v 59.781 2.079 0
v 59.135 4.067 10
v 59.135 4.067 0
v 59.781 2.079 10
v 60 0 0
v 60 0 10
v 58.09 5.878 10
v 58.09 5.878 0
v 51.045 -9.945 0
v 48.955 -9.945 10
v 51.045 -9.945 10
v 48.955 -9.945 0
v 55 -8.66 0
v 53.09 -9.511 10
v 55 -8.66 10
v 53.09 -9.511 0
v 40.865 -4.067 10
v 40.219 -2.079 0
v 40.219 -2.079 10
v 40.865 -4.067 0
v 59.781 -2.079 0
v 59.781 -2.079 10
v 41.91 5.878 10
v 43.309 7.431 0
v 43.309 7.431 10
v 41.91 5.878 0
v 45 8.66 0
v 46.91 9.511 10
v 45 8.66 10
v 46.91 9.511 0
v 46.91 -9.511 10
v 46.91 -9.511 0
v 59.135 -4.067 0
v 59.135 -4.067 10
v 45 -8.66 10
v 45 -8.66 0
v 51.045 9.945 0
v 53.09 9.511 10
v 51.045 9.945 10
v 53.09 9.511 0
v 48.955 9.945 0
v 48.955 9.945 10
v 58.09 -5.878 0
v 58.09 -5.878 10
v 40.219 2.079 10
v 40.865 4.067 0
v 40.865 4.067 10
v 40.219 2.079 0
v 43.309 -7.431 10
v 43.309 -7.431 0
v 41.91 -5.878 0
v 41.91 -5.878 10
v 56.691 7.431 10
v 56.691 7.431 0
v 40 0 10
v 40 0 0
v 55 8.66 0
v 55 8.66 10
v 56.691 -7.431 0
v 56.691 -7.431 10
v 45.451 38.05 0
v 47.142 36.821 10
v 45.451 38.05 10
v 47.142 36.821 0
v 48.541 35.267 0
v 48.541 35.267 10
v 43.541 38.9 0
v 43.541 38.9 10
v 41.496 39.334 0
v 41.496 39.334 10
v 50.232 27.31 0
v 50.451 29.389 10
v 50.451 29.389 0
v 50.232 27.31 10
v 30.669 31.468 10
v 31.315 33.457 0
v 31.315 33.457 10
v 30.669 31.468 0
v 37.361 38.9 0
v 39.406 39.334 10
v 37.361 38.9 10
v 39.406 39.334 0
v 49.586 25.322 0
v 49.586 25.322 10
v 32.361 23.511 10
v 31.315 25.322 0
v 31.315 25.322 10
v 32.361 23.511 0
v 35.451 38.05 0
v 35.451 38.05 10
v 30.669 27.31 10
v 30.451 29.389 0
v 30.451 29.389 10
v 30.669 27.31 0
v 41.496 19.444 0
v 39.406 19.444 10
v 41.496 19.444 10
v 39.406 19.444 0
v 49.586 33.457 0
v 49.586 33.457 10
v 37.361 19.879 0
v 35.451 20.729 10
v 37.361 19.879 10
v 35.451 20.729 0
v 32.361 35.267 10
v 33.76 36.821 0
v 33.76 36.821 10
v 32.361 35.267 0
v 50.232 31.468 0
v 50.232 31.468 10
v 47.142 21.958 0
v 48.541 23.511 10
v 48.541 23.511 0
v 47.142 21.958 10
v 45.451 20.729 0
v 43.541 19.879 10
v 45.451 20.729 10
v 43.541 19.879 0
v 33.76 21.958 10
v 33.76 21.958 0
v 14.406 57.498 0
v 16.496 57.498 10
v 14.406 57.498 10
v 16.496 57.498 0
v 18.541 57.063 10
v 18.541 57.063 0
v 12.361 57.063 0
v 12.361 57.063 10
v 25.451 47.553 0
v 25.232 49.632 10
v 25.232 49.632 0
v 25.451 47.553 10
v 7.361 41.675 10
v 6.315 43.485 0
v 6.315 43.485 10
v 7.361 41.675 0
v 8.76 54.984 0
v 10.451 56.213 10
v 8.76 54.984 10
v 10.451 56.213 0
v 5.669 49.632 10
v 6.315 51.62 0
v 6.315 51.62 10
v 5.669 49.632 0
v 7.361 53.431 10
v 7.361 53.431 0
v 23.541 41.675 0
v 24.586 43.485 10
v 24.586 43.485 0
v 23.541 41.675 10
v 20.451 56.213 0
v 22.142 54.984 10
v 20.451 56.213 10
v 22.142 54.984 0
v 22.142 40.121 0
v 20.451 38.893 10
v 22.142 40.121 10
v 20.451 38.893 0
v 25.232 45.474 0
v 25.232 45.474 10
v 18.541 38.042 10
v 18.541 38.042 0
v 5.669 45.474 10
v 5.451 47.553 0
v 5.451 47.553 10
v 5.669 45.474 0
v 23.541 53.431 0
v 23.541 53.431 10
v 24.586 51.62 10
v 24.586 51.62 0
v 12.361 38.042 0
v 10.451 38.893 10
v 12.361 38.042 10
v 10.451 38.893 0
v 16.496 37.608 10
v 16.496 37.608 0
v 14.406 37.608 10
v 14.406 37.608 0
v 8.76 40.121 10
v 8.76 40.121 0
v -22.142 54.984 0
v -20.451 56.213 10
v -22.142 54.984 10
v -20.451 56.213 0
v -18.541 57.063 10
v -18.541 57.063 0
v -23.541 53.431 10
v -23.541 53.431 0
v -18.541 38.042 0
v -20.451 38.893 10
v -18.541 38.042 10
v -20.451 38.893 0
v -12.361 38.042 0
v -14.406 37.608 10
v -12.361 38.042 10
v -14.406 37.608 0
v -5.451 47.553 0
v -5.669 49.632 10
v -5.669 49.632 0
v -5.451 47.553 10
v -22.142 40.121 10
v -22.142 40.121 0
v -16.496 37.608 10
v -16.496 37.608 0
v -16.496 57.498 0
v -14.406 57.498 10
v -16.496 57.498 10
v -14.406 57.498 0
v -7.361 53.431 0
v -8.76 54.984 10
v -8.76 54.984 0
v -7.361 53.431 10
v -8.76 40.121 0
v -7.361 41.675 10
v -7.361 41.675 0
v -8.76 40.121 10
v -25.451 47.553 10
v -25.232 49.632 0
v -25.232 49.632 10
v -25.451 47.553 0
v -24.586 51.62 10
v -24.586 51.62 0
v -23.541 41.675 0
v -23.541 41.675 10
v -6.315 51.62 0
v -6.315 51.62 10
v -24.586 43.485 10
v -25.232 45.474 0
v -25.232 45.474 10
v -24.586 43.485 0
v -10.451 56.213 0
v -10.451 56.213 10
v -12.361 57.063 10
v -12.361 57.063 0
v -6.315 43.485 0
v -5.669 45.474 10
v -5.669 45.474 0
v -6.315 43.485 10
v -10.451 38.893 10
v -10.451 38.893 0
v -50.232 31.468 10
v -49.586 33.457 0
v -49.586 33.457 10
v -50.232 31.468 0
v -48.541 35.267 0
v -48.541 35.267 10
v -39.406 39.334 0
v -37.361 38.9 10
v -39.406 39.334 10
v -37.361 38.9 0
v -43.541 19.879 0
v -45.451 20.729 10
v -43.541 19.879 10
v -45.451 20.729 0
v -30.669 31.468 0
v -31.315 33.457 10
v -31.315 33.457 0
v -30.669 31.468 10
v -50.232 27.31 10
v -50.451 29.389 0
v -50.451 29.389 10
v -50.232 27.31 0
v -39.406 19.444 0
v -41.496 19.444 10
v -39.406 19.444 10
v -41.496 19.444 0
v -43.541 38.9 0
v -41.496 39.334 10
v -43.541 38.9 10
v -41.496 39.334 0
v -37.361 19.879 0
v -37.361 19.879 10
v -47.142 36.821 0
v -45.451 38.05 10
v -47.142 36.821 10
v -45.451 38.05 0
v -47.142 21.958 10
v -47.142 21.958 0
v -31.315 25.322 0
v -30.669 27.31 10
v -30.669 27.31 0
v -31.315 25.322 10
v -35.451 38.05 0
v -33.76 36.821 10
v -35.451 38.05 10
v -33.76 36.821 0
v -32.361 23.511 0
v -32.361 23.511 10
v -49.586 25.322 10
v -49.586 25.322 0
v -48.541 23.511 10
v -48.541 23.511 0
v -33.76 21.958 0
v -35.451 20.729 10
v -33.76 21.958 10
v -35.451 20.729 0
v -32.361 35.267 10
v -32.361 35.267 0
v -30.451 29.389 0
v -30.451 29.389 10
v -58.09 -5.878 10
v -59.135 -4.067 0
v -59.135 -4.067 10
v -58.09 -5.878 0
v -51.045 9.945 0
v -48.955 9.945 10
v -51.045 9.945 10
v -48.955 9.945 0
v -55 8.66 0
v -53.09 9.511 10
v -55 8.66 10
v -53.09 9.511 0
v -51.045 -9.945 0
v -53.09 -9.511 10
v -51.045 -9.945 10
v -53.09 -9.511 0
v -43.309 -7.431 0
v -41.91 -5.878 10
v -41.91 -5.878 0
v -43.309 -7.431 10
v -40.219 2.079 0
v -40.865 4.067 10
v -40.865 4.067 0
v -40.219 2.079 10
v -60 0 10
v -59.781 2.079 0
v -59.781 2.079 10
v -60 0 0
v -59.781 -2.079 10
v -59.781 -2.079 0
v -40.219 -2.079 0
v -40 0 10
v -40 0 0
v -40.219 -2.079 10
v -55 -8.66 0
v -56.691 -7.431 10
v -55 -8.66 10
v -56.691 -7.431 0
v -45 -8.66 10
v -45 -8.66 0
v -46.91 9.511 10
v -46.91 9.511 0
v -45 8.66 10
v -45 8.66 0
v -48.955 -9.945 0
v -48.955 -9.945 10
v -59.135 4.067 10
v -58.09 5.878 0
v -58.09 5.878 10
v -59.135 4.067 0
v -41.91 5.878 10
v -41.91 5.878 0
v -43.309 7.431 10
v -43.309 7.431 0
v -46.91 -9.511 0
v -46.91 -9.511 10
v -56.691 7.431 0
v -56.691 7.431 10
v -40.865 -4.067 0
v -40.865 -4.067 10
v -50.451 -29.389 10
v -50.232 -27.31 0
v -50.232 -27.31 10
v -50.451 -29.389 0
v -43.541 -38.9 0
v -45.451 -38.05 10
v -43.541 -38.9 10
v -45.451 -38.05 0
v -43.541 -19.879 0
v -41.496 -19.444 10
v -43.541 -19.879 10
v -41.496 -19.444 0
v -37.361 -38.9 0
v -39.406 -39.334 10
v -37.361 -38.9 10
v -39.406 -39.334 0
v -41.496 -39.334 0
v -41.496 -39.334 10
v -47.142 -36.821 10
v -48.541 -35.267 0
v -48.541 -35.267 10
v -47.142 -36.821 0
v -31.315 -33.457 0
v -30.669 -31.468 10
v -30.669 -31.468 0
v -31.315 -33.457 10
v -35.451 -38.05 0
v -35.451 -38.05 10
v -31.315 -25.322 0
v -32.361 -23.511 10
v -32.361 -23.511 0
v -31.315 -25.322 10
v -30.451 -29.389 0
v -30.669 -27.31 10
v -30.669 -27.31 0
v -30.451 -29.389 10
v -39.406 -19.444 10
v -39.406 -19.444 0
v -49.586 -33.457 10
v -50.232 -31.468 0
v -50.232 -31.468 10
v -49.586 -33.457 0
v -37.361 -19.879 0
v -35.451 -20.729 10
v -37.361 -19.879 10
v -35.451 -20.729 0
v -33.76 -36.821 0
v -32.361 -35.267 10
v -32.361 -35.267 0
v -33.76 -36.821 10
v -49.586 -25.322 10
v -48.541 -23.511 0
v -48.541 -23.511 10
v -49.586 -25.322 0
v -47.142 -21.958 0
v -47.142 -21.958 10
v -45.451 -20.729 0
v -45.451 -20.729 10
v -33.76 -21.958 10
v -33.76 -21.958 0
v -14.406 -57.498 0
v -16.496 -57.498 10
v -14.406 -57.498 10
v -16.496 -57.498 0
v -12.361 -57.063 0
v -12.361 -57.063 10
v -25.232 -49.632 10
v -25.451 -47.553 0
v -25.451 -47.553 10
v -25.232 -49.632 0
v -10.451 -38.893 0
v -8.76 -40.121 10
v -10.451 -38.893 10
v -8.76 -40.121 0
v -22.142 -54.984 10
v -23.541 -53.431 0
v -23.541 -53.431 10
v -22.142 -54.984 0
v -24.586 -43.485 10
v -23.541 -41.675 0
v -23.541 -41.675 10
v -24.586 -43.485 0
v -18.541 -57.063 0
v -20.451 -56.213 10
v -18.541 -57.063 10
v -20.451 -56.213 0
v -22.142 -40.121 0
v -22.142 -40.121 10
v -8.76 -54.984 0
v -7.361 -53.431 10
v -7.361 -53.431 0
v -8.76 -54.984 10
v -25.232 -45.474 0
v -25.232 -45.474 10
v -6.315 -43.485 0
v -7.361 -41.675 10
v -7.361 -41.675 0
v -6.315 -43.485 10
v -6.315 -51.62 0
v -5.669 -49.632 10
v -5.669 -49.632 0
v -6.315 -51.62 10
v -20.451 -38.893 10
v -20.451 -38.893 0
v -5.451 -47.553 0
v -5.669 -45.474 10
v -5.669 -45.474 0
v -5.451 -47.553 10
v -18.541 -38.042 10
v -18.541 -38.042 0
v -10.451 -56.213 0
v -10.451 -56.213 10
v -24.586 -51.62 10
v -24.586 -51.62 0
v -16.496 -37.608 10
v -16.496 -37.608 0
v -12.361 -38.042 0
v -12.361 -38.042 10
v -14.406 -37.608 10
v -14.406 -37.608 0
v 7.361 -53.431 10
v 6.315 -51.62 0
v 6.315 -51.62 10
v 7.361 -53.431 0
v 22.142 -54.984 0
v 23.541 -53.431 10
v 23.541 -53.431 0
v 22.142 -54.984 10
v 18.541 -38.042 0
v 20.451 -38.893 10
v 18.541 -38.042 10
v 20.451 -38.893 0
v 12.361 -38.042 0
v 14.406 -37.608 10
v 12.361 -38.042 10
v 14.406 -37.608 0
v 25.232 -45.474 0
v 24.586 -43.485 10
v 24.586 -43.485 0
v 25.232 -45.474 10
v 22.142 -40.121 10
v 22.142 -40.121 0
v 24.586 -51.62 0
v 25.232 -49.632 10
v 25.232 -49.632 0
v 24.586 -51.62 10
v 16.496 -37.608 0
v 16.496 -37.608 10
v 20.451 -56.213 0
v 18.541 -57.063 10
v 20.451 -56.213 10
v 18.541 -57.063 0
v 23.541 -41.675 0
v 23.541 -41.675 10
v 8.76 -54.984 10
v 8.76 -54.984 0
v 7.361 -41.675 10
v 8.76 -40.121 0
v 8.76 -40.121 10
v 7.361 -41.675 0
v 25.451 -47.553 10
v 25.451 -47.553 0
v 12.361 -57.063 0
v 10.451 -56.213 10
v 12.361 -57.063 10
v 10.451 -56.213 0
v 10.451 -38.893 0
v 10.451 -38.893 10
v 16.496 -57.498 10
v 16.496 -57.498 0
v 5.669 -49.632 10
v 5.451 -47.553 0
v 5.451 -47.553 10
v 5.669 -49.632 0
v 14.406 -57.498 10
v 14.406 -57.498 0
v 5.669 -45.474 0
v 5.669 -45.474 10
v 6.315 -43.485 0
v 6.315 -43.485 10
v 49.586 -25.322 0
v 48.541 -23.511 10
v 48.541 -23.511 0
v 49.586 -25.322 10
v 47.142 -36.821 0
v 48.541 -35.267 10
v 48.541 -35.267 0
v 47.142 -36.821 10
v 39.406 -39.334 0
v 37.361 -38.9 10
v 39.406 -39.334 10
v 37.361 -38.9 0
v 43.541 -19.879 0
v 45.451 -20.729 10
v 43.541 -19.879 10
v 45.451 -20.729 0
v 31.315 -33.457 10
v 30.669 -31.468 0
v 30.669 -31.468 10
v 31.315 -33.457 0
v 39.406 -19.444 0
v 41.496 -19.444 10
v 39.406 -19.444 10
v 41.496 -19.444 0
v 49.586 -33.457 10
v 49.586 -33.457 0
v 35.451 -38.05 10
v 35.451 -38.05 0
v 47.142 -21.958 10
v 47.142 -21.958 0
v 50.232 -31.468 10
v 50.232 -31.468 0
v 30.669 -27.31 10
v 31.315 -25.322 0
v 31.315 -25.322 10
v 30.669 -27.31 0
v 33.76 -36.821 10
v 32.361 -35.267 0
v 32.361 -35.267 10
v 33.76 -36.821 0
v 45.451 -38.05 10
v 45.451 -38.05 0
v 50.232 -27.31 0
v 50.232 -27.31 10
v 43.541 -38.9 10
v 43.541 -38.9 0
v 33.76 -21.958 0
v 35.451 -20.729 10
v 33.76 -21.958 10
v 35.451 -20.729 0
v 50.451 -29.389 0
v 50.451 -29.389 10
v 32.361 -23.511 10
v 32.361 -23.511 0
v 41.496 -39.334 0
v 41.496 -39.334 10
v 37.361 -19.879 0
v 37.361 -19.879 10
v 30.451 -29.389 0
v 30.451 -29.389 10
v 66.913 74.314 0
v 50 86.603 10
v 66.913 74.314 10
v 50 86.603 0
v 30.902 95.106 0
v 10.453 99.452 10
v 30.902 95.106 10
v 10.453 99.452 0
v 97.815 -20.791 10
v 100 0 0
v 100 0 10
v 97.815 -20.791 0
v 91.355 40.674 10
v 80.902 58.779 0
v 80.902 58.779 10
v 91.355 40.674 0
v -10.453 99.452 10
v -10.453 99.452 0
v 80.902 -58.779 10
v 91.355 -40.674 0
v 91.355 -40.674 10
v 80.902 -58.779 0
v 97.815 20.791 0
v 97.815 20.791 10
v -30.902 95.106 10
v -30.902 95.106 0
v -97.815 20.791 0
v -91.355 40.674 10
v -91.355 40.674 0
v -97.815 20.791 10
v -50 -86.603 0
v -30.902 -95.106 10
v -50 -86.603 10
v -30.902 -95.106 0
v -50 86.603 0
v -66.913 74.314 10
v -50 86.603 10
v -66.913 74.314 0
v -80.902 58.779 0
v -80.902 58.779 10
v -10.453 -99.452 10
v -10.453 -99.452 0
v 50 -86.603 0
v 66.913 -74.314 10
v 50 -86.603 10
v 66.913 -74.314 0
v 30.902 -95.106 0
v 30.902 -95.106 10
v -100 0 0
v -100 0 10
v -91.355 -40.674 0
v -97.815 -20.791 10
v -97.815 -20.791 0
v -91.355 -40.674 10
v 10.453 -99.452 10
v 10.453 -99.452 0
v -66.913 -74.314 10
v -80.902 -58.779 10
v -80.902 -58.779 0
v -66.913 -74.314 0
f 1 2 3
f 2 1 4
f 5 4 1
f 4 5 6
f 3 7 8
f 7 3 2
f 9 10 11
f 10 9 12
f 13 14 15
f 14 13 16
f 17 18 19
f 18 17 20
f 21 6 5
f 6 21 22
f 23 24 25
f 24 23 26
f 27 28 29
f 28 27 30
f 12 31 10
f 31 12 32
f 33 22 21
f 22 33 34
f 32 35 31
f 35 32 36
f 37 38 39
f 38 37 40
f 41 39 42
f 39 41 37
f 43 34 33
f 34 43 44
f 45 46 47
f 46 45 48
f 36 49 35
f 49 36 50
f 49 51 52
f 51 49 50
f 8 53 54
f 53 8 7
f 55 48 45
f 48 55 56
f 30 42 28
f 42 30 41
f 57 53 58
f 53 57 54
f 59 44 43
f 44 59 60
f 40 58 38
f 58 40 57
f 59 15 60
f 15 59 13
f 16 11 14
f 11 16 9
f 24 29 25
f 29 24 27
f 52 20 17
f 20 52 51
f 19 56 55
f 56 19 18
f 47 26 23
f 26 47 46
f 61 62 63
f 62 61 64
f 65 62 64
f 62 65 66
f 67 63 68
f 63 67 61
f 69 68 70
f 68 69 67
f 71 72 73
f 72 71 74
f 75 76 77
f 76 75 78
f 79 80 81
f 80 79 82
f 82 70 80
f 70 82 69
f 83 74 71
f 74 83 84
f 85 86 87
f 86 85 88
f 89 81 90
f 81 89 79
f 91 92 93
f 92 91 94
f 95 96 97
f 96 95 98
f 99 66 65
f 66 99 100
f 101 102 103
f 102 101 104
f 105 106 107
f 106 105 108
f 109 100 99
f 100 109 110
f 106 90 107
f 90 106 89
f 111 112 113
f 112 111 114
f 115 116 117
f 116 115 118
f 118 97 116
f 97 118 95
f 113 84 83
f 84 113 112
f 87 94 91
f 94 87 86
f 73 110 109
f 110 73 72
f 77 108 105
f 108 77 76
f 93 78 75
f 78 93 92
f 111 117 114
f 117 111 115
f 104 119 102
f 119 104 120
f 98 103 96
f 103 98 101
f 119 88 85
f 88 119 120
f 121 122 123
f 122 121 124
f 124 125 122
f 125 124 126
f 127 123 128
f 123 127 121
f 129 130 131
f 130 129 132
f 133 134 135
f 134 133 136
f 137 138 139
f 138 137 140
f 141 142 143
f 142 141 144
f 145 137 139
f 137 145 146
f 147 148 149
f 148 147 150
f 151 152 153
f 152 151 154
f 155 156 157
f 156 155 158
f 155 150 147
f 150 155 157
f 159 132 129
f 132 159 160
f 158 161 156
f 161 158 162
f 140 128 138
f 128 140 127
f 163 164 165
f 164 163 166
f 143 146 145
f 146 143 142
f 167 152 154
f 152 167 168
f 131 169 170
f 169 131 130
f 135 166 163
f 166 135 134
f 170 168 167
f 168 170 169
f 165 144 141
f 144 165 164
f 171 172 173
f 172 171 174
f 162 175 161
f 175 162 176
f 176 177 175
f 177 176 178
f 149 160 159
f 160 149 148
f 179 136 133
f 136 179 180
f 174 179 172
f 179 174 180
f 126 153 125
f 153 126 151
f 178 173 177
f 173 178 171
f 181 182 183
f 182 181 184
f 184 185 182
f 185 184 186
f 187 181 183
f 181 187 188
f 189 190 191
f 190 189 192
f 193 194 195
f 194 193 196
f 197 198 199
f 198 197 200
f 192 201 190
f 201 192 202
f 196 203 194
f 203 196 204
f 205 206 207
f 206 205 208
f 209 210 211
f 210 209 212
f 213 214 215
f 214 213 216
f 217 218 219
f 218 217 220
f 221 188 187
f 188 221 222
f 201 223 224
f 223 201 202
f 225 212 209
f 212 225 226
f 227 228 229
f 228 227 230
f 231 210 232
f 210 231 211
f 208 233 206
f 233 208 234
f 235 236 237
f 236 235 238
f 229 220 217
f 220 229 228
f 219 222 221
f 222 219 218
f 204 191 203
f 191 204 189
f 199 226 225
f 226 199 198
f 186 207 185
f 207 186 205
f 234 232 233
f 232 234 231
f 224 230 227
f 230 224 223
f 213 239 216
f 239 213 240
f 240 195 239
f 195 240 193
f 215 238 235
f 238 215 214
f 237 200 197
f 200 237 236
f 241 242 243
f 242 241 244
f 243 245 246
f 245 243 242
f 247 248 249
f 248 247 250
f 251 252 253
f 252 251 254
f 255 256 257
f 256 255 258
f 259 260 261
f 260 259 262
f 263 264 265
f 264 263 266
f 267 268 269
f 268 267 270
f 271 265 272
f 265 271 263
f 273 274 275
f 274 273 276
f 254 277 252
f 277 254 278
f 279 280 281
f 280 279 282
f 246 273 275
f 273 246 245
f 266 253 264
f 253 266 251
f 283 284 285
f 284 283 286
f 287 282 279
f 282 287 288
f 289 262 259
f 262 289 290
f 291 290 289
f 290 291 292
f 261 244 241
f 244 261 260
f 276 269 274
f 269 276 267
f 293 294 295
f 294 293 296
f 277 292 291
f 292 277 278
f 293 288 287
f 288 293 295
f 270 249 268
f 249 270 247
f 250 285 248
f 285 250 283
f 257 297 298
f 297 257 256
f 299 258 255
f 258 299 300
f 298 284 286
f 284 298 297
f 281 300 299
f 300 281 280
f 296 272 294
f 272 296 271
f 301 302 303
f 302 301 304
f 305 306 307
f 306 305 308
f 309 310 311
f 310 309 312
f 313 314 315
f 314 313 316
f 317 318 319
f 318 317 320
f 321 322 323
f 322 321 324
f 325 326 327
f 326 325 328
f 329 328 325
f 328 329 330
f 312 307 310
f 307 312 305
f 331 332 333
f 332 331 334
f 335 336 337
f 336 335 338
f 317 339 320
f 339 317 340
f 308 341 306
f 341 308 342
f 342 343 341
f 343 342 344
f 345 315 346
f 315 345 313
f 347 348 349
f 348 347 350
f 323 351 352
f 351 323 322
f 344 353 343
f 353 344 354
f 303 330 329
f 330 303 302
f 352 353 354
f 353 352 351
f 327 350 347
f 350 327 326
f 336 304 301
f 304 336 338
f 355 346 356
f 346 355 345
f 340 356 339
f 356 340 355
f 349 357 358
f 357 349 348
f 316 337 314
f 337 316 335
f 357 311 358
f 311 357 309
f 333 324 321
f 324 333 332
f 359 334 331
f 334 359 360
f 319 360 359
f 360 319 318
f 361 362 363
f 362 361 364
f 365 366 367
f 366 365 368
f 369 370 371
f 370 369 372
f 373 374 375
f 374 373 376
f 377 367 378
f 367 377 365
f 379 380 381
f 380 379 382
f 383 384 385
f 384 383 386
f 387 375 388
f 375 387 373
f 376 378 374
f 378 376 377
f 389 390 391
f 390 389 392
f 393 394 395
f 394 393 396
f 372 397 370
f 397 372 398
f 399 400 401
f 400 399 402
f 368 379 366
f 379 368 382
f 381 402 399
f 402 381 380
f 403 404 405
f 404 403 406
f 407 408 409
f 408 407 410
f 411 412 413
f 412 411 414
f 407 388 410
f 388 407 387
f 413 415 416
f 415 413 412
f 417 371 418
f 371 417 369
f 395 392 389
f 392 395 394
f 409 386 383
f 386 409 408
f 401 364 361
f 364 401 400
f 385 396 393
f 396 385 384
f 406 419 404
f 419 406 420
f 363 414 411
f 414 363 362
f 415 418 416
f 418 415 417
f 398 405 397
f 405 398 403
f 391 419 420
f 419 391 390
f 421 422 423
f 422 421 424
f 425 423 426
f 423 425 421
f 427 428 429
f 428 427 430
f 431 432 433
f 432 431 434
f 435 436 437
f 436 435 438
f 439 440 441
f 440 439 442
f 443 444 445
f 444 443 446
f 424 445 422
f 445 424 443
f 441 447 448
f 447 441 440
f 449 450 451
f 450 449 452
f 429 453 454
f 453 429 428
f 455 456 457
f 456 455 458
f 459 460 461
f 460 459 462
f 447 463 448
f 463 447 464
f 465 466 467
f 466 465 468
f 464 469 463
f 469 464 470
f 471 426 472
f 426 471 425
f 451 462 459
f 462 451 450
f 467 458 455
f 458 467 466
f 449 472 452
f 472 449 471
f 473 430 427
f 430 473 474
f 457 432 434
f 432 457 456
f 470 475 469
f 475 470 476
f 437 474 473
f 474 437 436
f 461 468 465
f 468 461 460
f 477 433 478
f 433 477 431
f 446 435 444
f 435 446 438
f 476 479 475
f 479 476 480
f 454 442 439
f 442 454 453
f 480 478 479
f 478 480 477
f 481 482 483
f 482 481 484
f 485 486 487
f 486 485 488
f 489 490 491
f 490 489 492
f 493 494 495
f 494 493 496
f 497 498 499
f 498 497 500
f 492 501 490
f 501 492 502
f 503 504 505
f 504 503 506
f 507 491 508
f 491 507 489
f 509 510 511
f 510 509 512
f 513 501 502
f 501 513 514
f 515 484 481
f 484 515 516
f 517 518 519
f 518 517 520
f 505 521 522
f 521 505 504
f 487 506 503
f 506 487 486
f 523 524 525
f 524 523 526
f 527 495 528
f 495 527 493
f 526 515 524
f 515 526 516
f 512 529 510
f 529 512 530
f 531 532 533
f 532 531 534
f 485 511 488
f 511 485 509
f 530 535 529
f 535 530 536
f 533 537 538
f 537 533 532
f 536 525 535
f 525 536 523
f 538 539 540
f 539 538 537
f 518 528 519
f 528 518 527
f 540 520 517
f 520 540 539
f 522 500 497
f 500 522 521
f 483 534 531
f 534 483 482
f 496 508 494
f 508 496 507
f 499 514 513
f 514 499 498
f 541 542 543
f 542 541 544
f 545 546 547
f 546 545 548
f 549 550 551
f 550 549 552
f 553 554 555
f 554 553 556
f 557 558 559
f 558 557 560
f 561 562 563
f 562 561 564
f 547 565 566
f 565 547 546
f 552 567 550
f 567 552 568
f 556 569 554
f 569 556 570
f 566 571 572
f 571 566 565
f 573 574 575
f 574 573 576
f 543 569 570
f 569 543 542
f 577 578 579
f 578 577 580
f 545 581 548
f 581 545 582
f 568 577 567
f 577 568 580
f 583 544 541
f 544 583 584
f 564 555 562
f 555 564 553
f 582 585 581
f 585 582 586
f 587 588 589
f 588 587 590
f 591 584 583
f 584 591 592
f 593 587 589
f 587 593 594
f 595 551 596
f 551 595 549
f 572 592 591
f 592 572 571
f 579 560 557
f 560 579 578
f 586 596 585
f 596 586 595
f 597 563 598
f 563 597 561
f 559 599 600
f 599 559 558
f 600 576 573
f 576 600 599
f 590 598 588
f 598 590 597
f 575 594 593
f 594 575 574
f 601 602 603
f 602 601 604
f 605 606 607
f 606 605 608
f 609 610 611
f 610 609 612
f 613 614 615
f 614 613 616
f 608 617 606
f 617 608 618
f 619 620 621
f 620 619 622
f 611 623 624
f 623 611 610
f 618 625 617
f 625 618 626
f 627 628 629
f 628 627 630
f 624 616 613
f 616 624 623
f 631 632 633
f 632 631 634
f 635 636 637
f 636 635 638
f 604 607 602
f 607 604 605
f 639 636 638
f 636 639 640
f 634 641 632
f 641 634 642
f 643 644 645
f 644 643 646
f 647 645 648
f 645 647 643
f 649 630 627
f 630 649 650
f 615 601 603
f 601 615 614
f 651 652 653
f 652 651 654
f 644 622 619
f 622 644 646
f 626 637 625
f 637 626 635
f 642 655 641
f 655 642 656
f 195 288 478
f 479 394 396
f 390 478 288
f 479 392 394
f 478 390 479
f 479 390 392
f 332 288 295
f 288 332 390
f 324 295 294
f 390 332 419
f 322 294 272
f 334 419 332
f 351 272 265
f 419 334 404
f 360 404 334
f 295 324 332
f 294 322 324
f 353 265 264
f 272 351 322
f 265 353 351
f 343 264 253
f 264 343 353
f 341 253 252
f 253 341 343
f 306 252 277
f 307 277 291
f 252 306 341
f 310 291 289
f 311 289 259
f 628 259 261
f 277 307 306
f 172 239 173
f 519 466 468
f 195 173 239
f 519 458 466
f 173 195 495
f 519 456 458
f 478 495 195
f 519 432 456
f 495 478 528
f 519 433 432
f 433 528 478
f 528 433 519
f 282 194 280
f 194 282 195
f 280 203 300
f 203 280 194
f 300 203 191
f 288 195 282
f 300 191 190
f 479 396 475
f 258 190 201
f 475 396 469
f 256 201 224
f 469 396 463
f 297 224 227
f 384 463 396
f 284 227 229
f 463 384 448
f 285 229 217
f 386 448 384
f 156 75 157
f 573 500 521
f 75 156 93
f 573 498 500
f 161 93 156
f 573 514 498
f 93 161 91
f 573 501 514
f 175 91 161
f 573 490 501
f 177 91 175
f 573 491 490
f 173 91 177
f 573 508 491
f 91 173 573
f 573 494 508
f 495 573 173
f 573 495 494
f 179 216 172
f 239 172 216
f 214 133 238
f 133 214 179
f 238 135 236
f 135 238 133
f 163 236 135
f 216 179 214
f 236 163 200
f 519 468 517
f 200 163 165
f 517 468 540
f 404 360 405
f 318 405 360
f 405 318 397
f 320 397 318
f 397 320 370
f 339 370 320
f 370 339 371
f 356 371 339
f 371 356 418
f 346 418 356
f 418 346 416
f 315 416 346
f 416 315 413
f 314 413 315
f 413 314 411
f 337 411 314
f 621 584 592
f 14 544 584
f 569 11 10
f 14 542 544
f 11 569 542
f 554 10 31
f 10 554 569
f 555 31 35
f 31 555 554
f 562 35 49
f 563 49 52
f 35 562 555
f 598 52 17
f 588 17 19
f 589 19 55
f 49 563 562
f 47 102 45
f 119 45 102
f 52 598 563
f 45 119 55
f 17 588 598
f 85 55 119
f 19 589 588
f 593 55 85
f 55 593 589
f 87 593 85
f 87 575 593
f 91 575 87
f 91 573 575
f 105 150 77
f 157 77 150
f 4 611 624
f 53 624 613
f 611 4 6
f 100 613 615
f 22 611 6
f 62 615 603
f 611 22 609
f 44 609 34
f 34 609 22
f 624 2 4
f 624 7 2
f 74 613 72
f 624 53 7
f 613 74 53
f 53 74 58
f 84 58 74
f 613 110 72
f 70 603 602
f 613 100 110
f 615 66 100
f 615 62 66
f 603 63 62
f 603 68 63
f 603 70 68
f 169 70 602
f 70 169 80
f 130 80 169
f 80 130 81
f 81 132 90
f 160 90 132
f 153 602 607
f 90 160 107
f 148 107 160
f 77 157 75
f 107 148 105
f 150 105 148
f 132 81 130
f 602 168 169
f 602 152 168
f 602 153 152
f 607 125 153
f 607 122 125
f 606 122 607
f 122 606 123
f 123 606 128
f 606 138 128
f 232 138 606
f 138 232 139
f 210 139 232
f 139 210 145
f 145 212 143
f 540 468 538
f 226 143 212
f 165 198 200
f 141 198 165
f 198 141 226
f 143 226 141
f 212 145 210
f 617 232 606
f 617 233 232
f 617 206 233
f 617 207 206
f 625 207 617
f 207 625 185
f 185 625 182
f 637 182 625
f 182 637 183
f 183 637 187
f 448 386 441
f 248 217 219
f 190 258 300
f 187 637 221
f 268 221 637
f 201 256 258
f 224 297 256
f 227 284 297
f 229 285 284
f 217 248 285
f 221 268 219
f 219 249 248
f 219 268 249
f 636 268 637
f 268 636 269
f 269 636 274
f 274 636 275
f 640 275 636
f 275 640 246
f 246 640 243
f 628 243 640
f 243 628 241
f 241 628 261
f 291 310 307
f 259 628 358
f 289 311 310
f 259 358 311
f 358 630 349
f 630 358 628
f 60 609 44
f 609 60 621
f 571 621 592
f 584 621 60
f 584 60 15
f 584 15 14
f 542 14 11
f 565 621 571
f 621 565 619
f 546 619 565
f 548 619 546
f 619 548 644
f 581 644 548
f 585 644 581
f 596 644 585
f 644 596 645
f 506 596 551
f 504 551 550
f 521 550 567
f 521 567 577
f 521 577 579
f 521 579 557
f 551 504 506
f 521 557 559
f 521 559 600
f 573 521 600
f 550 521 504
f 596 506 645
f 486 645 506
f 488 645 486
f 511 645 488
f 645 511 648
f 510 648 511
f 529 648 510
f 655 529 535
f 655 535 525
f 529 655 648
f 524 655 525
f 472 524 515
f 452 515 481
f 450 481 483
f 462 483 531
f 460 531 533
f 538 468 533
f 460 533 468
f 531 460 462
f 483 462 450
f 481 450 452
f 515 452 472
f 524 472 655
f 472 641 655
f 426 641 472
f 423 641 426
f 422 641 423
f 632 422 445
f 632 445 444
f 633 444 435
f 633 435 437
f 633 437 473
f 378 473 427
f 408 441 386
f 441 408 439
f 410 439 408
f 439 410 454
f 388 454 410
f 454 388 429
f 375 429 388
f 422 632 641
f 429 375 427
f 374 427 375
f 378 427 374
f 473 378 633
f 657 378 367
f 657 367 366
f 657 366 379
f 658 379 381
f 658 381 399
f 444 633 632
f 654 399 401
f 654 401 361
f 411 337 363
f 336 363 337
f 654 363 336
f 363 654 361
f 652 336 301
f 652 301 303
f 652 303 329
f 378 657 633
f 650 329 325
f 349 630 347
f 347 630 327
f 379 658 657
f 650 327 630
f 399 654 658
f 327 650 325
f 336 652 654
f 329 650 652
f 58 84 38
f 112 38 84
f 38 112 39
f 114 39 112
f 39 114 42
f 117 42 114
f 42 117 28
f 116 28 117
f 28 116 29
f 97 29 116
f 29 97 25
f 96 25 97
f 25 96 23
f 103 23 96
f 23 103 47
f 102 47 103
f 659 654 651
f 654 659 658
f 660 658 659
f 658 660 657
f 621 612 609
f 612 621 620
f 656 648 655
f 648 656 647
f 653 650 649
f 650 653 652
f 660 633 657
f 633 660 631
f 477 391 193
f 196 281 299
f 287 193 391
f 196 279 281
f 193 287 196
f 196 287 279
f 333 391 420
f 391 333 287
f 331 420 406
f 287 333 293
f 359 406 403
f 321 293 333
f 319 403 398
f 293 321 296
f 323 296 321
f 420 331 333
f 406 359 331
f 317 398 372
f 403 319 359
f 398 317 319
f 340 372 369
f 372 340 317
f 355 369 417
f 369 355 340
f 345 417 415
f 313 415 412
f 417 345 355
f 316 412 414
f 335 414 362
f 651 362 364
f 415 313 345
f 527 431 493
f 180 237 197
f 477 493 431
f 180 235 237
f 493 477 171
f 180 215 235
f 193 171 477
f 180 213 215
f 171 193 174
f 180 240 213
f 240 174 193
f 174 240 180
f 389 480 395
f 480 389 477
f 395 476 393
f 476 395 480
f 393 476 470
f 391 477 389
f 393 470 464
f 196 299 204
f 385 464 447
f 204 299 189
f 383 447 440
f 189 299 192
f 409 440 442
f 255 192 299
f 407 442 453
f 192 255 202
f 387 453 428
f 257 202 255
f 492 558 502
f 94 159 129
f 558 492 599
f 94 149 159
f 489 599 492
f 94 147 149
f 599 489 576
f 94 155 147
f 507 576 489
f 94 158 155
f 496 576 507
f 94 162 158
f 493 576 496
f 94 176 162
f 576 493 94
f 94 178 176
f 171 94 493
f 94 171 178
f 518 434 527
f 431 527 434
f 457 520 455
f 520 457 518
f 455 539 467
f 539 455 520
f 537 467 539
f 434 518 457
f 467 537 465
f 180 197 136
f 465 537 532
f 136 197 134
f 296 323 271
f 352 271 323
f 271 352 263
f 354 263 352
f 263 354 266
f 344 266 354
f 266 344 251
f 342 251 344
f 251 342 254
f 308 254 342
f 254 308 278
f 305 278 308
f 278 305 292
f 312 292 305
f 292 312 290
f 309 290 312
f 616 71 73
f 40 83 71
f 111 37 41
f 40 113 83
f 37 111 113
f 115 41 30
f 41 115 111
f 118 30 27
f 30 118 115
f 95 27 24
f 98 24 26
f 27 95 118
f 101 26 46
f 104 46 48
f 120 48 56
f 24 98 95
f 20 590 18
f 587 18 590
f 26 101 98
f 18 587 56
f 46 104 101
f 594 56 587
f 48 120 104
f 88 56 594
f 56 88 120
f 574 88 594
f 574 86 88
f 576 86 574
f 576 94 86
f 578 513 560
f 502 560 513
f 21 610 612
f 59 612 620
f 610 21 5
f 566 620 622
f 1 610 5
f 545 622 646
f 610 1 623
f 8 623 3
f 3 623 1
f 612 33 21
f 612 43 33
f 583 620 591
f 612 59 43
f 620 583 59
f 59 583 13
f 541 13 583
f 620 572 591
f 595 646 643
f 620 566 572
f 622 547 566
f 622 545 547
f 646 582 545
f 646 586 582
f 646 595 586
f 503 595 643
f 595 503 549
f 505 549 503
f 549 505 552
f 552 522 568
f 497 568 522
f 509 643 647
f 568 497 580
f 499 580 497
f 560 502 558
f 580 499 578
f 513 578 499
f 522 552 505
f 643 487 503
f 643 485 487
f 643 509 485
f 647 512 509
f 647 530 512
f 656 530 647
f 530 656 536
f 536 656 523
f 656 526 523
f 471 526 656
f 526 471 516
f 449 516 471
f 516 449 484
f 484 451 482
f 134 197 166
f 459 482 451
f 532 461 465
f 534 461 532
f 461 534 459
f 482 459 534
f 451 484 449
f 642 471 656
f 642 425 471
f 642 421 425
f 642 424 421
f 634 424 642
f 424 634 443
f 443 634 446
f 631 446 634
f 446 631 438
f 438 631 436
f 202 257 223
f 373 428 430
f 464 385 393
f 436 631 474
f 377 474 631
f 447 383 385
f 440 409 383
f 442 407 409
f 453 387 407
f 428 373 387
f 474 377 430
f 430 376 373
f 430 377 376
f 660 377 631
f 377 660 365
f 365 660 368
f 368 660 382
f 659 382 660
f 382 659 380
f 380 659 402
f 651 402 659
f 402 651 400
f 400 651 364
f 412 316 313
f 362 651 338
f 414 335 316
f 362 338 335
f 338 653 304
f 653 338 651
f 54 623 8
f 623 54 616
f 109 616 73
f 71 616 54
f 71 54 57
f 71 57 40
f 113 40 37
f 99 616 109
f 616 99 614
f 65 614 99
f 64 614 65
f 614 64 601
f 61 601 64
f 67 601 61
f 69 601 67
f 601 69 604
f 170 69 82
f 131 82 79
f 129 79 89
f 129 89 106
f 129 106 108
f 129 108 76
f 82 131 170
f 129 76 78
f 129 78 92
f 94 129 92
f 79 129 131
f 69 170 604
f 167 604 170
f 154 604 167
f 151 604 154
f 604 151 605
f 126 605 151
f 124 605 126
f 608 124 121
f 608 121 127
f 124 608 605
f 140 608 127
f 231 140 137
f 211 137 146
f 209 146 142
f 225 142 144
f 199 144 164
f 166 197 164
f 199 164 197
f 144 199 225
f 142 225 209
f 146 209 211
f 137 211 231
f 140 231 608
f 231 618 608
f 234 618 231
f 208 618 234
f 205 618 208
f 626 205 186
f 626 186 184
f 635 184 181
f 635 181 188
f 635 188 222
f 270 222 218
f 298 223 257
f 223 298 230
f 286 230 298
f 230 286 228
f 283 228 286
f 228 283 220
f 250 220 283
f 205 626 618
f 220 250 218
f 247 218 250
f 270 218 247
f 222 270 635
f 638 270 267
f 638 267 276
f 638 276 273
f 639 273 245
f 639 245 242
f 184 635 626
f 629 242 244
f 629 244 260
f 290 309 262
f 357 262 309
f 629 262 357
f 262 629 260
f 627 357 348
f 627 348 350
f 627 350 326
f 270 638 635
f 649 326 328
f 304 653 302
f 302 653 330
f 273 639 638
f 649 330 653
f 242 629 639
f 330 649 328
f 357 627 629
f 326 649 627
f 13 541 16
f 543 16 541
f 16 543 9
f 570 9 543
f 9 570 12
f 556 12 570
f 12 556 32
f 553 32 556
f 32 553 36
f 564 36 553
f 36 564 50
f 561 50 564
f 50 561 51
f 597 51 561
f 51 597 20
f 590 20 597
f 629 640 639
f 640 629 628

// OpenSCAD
module roata(raza,grosime,raza_gaura,nr_gauri)
{
    difference(){
        cylinder(h=grosime,r=raza);
        for(i=[0:360/nr_gauri:359])
            rotate([0,0,i])
                translate([raza/2,0,-1])
        cylinder(r=raza_gaura,h=grosime+2);
    }
}
rotate([0,0,$t*360])
roata(raza=100,grosime=10,raza_gaura=10,nr_gauri=10);
